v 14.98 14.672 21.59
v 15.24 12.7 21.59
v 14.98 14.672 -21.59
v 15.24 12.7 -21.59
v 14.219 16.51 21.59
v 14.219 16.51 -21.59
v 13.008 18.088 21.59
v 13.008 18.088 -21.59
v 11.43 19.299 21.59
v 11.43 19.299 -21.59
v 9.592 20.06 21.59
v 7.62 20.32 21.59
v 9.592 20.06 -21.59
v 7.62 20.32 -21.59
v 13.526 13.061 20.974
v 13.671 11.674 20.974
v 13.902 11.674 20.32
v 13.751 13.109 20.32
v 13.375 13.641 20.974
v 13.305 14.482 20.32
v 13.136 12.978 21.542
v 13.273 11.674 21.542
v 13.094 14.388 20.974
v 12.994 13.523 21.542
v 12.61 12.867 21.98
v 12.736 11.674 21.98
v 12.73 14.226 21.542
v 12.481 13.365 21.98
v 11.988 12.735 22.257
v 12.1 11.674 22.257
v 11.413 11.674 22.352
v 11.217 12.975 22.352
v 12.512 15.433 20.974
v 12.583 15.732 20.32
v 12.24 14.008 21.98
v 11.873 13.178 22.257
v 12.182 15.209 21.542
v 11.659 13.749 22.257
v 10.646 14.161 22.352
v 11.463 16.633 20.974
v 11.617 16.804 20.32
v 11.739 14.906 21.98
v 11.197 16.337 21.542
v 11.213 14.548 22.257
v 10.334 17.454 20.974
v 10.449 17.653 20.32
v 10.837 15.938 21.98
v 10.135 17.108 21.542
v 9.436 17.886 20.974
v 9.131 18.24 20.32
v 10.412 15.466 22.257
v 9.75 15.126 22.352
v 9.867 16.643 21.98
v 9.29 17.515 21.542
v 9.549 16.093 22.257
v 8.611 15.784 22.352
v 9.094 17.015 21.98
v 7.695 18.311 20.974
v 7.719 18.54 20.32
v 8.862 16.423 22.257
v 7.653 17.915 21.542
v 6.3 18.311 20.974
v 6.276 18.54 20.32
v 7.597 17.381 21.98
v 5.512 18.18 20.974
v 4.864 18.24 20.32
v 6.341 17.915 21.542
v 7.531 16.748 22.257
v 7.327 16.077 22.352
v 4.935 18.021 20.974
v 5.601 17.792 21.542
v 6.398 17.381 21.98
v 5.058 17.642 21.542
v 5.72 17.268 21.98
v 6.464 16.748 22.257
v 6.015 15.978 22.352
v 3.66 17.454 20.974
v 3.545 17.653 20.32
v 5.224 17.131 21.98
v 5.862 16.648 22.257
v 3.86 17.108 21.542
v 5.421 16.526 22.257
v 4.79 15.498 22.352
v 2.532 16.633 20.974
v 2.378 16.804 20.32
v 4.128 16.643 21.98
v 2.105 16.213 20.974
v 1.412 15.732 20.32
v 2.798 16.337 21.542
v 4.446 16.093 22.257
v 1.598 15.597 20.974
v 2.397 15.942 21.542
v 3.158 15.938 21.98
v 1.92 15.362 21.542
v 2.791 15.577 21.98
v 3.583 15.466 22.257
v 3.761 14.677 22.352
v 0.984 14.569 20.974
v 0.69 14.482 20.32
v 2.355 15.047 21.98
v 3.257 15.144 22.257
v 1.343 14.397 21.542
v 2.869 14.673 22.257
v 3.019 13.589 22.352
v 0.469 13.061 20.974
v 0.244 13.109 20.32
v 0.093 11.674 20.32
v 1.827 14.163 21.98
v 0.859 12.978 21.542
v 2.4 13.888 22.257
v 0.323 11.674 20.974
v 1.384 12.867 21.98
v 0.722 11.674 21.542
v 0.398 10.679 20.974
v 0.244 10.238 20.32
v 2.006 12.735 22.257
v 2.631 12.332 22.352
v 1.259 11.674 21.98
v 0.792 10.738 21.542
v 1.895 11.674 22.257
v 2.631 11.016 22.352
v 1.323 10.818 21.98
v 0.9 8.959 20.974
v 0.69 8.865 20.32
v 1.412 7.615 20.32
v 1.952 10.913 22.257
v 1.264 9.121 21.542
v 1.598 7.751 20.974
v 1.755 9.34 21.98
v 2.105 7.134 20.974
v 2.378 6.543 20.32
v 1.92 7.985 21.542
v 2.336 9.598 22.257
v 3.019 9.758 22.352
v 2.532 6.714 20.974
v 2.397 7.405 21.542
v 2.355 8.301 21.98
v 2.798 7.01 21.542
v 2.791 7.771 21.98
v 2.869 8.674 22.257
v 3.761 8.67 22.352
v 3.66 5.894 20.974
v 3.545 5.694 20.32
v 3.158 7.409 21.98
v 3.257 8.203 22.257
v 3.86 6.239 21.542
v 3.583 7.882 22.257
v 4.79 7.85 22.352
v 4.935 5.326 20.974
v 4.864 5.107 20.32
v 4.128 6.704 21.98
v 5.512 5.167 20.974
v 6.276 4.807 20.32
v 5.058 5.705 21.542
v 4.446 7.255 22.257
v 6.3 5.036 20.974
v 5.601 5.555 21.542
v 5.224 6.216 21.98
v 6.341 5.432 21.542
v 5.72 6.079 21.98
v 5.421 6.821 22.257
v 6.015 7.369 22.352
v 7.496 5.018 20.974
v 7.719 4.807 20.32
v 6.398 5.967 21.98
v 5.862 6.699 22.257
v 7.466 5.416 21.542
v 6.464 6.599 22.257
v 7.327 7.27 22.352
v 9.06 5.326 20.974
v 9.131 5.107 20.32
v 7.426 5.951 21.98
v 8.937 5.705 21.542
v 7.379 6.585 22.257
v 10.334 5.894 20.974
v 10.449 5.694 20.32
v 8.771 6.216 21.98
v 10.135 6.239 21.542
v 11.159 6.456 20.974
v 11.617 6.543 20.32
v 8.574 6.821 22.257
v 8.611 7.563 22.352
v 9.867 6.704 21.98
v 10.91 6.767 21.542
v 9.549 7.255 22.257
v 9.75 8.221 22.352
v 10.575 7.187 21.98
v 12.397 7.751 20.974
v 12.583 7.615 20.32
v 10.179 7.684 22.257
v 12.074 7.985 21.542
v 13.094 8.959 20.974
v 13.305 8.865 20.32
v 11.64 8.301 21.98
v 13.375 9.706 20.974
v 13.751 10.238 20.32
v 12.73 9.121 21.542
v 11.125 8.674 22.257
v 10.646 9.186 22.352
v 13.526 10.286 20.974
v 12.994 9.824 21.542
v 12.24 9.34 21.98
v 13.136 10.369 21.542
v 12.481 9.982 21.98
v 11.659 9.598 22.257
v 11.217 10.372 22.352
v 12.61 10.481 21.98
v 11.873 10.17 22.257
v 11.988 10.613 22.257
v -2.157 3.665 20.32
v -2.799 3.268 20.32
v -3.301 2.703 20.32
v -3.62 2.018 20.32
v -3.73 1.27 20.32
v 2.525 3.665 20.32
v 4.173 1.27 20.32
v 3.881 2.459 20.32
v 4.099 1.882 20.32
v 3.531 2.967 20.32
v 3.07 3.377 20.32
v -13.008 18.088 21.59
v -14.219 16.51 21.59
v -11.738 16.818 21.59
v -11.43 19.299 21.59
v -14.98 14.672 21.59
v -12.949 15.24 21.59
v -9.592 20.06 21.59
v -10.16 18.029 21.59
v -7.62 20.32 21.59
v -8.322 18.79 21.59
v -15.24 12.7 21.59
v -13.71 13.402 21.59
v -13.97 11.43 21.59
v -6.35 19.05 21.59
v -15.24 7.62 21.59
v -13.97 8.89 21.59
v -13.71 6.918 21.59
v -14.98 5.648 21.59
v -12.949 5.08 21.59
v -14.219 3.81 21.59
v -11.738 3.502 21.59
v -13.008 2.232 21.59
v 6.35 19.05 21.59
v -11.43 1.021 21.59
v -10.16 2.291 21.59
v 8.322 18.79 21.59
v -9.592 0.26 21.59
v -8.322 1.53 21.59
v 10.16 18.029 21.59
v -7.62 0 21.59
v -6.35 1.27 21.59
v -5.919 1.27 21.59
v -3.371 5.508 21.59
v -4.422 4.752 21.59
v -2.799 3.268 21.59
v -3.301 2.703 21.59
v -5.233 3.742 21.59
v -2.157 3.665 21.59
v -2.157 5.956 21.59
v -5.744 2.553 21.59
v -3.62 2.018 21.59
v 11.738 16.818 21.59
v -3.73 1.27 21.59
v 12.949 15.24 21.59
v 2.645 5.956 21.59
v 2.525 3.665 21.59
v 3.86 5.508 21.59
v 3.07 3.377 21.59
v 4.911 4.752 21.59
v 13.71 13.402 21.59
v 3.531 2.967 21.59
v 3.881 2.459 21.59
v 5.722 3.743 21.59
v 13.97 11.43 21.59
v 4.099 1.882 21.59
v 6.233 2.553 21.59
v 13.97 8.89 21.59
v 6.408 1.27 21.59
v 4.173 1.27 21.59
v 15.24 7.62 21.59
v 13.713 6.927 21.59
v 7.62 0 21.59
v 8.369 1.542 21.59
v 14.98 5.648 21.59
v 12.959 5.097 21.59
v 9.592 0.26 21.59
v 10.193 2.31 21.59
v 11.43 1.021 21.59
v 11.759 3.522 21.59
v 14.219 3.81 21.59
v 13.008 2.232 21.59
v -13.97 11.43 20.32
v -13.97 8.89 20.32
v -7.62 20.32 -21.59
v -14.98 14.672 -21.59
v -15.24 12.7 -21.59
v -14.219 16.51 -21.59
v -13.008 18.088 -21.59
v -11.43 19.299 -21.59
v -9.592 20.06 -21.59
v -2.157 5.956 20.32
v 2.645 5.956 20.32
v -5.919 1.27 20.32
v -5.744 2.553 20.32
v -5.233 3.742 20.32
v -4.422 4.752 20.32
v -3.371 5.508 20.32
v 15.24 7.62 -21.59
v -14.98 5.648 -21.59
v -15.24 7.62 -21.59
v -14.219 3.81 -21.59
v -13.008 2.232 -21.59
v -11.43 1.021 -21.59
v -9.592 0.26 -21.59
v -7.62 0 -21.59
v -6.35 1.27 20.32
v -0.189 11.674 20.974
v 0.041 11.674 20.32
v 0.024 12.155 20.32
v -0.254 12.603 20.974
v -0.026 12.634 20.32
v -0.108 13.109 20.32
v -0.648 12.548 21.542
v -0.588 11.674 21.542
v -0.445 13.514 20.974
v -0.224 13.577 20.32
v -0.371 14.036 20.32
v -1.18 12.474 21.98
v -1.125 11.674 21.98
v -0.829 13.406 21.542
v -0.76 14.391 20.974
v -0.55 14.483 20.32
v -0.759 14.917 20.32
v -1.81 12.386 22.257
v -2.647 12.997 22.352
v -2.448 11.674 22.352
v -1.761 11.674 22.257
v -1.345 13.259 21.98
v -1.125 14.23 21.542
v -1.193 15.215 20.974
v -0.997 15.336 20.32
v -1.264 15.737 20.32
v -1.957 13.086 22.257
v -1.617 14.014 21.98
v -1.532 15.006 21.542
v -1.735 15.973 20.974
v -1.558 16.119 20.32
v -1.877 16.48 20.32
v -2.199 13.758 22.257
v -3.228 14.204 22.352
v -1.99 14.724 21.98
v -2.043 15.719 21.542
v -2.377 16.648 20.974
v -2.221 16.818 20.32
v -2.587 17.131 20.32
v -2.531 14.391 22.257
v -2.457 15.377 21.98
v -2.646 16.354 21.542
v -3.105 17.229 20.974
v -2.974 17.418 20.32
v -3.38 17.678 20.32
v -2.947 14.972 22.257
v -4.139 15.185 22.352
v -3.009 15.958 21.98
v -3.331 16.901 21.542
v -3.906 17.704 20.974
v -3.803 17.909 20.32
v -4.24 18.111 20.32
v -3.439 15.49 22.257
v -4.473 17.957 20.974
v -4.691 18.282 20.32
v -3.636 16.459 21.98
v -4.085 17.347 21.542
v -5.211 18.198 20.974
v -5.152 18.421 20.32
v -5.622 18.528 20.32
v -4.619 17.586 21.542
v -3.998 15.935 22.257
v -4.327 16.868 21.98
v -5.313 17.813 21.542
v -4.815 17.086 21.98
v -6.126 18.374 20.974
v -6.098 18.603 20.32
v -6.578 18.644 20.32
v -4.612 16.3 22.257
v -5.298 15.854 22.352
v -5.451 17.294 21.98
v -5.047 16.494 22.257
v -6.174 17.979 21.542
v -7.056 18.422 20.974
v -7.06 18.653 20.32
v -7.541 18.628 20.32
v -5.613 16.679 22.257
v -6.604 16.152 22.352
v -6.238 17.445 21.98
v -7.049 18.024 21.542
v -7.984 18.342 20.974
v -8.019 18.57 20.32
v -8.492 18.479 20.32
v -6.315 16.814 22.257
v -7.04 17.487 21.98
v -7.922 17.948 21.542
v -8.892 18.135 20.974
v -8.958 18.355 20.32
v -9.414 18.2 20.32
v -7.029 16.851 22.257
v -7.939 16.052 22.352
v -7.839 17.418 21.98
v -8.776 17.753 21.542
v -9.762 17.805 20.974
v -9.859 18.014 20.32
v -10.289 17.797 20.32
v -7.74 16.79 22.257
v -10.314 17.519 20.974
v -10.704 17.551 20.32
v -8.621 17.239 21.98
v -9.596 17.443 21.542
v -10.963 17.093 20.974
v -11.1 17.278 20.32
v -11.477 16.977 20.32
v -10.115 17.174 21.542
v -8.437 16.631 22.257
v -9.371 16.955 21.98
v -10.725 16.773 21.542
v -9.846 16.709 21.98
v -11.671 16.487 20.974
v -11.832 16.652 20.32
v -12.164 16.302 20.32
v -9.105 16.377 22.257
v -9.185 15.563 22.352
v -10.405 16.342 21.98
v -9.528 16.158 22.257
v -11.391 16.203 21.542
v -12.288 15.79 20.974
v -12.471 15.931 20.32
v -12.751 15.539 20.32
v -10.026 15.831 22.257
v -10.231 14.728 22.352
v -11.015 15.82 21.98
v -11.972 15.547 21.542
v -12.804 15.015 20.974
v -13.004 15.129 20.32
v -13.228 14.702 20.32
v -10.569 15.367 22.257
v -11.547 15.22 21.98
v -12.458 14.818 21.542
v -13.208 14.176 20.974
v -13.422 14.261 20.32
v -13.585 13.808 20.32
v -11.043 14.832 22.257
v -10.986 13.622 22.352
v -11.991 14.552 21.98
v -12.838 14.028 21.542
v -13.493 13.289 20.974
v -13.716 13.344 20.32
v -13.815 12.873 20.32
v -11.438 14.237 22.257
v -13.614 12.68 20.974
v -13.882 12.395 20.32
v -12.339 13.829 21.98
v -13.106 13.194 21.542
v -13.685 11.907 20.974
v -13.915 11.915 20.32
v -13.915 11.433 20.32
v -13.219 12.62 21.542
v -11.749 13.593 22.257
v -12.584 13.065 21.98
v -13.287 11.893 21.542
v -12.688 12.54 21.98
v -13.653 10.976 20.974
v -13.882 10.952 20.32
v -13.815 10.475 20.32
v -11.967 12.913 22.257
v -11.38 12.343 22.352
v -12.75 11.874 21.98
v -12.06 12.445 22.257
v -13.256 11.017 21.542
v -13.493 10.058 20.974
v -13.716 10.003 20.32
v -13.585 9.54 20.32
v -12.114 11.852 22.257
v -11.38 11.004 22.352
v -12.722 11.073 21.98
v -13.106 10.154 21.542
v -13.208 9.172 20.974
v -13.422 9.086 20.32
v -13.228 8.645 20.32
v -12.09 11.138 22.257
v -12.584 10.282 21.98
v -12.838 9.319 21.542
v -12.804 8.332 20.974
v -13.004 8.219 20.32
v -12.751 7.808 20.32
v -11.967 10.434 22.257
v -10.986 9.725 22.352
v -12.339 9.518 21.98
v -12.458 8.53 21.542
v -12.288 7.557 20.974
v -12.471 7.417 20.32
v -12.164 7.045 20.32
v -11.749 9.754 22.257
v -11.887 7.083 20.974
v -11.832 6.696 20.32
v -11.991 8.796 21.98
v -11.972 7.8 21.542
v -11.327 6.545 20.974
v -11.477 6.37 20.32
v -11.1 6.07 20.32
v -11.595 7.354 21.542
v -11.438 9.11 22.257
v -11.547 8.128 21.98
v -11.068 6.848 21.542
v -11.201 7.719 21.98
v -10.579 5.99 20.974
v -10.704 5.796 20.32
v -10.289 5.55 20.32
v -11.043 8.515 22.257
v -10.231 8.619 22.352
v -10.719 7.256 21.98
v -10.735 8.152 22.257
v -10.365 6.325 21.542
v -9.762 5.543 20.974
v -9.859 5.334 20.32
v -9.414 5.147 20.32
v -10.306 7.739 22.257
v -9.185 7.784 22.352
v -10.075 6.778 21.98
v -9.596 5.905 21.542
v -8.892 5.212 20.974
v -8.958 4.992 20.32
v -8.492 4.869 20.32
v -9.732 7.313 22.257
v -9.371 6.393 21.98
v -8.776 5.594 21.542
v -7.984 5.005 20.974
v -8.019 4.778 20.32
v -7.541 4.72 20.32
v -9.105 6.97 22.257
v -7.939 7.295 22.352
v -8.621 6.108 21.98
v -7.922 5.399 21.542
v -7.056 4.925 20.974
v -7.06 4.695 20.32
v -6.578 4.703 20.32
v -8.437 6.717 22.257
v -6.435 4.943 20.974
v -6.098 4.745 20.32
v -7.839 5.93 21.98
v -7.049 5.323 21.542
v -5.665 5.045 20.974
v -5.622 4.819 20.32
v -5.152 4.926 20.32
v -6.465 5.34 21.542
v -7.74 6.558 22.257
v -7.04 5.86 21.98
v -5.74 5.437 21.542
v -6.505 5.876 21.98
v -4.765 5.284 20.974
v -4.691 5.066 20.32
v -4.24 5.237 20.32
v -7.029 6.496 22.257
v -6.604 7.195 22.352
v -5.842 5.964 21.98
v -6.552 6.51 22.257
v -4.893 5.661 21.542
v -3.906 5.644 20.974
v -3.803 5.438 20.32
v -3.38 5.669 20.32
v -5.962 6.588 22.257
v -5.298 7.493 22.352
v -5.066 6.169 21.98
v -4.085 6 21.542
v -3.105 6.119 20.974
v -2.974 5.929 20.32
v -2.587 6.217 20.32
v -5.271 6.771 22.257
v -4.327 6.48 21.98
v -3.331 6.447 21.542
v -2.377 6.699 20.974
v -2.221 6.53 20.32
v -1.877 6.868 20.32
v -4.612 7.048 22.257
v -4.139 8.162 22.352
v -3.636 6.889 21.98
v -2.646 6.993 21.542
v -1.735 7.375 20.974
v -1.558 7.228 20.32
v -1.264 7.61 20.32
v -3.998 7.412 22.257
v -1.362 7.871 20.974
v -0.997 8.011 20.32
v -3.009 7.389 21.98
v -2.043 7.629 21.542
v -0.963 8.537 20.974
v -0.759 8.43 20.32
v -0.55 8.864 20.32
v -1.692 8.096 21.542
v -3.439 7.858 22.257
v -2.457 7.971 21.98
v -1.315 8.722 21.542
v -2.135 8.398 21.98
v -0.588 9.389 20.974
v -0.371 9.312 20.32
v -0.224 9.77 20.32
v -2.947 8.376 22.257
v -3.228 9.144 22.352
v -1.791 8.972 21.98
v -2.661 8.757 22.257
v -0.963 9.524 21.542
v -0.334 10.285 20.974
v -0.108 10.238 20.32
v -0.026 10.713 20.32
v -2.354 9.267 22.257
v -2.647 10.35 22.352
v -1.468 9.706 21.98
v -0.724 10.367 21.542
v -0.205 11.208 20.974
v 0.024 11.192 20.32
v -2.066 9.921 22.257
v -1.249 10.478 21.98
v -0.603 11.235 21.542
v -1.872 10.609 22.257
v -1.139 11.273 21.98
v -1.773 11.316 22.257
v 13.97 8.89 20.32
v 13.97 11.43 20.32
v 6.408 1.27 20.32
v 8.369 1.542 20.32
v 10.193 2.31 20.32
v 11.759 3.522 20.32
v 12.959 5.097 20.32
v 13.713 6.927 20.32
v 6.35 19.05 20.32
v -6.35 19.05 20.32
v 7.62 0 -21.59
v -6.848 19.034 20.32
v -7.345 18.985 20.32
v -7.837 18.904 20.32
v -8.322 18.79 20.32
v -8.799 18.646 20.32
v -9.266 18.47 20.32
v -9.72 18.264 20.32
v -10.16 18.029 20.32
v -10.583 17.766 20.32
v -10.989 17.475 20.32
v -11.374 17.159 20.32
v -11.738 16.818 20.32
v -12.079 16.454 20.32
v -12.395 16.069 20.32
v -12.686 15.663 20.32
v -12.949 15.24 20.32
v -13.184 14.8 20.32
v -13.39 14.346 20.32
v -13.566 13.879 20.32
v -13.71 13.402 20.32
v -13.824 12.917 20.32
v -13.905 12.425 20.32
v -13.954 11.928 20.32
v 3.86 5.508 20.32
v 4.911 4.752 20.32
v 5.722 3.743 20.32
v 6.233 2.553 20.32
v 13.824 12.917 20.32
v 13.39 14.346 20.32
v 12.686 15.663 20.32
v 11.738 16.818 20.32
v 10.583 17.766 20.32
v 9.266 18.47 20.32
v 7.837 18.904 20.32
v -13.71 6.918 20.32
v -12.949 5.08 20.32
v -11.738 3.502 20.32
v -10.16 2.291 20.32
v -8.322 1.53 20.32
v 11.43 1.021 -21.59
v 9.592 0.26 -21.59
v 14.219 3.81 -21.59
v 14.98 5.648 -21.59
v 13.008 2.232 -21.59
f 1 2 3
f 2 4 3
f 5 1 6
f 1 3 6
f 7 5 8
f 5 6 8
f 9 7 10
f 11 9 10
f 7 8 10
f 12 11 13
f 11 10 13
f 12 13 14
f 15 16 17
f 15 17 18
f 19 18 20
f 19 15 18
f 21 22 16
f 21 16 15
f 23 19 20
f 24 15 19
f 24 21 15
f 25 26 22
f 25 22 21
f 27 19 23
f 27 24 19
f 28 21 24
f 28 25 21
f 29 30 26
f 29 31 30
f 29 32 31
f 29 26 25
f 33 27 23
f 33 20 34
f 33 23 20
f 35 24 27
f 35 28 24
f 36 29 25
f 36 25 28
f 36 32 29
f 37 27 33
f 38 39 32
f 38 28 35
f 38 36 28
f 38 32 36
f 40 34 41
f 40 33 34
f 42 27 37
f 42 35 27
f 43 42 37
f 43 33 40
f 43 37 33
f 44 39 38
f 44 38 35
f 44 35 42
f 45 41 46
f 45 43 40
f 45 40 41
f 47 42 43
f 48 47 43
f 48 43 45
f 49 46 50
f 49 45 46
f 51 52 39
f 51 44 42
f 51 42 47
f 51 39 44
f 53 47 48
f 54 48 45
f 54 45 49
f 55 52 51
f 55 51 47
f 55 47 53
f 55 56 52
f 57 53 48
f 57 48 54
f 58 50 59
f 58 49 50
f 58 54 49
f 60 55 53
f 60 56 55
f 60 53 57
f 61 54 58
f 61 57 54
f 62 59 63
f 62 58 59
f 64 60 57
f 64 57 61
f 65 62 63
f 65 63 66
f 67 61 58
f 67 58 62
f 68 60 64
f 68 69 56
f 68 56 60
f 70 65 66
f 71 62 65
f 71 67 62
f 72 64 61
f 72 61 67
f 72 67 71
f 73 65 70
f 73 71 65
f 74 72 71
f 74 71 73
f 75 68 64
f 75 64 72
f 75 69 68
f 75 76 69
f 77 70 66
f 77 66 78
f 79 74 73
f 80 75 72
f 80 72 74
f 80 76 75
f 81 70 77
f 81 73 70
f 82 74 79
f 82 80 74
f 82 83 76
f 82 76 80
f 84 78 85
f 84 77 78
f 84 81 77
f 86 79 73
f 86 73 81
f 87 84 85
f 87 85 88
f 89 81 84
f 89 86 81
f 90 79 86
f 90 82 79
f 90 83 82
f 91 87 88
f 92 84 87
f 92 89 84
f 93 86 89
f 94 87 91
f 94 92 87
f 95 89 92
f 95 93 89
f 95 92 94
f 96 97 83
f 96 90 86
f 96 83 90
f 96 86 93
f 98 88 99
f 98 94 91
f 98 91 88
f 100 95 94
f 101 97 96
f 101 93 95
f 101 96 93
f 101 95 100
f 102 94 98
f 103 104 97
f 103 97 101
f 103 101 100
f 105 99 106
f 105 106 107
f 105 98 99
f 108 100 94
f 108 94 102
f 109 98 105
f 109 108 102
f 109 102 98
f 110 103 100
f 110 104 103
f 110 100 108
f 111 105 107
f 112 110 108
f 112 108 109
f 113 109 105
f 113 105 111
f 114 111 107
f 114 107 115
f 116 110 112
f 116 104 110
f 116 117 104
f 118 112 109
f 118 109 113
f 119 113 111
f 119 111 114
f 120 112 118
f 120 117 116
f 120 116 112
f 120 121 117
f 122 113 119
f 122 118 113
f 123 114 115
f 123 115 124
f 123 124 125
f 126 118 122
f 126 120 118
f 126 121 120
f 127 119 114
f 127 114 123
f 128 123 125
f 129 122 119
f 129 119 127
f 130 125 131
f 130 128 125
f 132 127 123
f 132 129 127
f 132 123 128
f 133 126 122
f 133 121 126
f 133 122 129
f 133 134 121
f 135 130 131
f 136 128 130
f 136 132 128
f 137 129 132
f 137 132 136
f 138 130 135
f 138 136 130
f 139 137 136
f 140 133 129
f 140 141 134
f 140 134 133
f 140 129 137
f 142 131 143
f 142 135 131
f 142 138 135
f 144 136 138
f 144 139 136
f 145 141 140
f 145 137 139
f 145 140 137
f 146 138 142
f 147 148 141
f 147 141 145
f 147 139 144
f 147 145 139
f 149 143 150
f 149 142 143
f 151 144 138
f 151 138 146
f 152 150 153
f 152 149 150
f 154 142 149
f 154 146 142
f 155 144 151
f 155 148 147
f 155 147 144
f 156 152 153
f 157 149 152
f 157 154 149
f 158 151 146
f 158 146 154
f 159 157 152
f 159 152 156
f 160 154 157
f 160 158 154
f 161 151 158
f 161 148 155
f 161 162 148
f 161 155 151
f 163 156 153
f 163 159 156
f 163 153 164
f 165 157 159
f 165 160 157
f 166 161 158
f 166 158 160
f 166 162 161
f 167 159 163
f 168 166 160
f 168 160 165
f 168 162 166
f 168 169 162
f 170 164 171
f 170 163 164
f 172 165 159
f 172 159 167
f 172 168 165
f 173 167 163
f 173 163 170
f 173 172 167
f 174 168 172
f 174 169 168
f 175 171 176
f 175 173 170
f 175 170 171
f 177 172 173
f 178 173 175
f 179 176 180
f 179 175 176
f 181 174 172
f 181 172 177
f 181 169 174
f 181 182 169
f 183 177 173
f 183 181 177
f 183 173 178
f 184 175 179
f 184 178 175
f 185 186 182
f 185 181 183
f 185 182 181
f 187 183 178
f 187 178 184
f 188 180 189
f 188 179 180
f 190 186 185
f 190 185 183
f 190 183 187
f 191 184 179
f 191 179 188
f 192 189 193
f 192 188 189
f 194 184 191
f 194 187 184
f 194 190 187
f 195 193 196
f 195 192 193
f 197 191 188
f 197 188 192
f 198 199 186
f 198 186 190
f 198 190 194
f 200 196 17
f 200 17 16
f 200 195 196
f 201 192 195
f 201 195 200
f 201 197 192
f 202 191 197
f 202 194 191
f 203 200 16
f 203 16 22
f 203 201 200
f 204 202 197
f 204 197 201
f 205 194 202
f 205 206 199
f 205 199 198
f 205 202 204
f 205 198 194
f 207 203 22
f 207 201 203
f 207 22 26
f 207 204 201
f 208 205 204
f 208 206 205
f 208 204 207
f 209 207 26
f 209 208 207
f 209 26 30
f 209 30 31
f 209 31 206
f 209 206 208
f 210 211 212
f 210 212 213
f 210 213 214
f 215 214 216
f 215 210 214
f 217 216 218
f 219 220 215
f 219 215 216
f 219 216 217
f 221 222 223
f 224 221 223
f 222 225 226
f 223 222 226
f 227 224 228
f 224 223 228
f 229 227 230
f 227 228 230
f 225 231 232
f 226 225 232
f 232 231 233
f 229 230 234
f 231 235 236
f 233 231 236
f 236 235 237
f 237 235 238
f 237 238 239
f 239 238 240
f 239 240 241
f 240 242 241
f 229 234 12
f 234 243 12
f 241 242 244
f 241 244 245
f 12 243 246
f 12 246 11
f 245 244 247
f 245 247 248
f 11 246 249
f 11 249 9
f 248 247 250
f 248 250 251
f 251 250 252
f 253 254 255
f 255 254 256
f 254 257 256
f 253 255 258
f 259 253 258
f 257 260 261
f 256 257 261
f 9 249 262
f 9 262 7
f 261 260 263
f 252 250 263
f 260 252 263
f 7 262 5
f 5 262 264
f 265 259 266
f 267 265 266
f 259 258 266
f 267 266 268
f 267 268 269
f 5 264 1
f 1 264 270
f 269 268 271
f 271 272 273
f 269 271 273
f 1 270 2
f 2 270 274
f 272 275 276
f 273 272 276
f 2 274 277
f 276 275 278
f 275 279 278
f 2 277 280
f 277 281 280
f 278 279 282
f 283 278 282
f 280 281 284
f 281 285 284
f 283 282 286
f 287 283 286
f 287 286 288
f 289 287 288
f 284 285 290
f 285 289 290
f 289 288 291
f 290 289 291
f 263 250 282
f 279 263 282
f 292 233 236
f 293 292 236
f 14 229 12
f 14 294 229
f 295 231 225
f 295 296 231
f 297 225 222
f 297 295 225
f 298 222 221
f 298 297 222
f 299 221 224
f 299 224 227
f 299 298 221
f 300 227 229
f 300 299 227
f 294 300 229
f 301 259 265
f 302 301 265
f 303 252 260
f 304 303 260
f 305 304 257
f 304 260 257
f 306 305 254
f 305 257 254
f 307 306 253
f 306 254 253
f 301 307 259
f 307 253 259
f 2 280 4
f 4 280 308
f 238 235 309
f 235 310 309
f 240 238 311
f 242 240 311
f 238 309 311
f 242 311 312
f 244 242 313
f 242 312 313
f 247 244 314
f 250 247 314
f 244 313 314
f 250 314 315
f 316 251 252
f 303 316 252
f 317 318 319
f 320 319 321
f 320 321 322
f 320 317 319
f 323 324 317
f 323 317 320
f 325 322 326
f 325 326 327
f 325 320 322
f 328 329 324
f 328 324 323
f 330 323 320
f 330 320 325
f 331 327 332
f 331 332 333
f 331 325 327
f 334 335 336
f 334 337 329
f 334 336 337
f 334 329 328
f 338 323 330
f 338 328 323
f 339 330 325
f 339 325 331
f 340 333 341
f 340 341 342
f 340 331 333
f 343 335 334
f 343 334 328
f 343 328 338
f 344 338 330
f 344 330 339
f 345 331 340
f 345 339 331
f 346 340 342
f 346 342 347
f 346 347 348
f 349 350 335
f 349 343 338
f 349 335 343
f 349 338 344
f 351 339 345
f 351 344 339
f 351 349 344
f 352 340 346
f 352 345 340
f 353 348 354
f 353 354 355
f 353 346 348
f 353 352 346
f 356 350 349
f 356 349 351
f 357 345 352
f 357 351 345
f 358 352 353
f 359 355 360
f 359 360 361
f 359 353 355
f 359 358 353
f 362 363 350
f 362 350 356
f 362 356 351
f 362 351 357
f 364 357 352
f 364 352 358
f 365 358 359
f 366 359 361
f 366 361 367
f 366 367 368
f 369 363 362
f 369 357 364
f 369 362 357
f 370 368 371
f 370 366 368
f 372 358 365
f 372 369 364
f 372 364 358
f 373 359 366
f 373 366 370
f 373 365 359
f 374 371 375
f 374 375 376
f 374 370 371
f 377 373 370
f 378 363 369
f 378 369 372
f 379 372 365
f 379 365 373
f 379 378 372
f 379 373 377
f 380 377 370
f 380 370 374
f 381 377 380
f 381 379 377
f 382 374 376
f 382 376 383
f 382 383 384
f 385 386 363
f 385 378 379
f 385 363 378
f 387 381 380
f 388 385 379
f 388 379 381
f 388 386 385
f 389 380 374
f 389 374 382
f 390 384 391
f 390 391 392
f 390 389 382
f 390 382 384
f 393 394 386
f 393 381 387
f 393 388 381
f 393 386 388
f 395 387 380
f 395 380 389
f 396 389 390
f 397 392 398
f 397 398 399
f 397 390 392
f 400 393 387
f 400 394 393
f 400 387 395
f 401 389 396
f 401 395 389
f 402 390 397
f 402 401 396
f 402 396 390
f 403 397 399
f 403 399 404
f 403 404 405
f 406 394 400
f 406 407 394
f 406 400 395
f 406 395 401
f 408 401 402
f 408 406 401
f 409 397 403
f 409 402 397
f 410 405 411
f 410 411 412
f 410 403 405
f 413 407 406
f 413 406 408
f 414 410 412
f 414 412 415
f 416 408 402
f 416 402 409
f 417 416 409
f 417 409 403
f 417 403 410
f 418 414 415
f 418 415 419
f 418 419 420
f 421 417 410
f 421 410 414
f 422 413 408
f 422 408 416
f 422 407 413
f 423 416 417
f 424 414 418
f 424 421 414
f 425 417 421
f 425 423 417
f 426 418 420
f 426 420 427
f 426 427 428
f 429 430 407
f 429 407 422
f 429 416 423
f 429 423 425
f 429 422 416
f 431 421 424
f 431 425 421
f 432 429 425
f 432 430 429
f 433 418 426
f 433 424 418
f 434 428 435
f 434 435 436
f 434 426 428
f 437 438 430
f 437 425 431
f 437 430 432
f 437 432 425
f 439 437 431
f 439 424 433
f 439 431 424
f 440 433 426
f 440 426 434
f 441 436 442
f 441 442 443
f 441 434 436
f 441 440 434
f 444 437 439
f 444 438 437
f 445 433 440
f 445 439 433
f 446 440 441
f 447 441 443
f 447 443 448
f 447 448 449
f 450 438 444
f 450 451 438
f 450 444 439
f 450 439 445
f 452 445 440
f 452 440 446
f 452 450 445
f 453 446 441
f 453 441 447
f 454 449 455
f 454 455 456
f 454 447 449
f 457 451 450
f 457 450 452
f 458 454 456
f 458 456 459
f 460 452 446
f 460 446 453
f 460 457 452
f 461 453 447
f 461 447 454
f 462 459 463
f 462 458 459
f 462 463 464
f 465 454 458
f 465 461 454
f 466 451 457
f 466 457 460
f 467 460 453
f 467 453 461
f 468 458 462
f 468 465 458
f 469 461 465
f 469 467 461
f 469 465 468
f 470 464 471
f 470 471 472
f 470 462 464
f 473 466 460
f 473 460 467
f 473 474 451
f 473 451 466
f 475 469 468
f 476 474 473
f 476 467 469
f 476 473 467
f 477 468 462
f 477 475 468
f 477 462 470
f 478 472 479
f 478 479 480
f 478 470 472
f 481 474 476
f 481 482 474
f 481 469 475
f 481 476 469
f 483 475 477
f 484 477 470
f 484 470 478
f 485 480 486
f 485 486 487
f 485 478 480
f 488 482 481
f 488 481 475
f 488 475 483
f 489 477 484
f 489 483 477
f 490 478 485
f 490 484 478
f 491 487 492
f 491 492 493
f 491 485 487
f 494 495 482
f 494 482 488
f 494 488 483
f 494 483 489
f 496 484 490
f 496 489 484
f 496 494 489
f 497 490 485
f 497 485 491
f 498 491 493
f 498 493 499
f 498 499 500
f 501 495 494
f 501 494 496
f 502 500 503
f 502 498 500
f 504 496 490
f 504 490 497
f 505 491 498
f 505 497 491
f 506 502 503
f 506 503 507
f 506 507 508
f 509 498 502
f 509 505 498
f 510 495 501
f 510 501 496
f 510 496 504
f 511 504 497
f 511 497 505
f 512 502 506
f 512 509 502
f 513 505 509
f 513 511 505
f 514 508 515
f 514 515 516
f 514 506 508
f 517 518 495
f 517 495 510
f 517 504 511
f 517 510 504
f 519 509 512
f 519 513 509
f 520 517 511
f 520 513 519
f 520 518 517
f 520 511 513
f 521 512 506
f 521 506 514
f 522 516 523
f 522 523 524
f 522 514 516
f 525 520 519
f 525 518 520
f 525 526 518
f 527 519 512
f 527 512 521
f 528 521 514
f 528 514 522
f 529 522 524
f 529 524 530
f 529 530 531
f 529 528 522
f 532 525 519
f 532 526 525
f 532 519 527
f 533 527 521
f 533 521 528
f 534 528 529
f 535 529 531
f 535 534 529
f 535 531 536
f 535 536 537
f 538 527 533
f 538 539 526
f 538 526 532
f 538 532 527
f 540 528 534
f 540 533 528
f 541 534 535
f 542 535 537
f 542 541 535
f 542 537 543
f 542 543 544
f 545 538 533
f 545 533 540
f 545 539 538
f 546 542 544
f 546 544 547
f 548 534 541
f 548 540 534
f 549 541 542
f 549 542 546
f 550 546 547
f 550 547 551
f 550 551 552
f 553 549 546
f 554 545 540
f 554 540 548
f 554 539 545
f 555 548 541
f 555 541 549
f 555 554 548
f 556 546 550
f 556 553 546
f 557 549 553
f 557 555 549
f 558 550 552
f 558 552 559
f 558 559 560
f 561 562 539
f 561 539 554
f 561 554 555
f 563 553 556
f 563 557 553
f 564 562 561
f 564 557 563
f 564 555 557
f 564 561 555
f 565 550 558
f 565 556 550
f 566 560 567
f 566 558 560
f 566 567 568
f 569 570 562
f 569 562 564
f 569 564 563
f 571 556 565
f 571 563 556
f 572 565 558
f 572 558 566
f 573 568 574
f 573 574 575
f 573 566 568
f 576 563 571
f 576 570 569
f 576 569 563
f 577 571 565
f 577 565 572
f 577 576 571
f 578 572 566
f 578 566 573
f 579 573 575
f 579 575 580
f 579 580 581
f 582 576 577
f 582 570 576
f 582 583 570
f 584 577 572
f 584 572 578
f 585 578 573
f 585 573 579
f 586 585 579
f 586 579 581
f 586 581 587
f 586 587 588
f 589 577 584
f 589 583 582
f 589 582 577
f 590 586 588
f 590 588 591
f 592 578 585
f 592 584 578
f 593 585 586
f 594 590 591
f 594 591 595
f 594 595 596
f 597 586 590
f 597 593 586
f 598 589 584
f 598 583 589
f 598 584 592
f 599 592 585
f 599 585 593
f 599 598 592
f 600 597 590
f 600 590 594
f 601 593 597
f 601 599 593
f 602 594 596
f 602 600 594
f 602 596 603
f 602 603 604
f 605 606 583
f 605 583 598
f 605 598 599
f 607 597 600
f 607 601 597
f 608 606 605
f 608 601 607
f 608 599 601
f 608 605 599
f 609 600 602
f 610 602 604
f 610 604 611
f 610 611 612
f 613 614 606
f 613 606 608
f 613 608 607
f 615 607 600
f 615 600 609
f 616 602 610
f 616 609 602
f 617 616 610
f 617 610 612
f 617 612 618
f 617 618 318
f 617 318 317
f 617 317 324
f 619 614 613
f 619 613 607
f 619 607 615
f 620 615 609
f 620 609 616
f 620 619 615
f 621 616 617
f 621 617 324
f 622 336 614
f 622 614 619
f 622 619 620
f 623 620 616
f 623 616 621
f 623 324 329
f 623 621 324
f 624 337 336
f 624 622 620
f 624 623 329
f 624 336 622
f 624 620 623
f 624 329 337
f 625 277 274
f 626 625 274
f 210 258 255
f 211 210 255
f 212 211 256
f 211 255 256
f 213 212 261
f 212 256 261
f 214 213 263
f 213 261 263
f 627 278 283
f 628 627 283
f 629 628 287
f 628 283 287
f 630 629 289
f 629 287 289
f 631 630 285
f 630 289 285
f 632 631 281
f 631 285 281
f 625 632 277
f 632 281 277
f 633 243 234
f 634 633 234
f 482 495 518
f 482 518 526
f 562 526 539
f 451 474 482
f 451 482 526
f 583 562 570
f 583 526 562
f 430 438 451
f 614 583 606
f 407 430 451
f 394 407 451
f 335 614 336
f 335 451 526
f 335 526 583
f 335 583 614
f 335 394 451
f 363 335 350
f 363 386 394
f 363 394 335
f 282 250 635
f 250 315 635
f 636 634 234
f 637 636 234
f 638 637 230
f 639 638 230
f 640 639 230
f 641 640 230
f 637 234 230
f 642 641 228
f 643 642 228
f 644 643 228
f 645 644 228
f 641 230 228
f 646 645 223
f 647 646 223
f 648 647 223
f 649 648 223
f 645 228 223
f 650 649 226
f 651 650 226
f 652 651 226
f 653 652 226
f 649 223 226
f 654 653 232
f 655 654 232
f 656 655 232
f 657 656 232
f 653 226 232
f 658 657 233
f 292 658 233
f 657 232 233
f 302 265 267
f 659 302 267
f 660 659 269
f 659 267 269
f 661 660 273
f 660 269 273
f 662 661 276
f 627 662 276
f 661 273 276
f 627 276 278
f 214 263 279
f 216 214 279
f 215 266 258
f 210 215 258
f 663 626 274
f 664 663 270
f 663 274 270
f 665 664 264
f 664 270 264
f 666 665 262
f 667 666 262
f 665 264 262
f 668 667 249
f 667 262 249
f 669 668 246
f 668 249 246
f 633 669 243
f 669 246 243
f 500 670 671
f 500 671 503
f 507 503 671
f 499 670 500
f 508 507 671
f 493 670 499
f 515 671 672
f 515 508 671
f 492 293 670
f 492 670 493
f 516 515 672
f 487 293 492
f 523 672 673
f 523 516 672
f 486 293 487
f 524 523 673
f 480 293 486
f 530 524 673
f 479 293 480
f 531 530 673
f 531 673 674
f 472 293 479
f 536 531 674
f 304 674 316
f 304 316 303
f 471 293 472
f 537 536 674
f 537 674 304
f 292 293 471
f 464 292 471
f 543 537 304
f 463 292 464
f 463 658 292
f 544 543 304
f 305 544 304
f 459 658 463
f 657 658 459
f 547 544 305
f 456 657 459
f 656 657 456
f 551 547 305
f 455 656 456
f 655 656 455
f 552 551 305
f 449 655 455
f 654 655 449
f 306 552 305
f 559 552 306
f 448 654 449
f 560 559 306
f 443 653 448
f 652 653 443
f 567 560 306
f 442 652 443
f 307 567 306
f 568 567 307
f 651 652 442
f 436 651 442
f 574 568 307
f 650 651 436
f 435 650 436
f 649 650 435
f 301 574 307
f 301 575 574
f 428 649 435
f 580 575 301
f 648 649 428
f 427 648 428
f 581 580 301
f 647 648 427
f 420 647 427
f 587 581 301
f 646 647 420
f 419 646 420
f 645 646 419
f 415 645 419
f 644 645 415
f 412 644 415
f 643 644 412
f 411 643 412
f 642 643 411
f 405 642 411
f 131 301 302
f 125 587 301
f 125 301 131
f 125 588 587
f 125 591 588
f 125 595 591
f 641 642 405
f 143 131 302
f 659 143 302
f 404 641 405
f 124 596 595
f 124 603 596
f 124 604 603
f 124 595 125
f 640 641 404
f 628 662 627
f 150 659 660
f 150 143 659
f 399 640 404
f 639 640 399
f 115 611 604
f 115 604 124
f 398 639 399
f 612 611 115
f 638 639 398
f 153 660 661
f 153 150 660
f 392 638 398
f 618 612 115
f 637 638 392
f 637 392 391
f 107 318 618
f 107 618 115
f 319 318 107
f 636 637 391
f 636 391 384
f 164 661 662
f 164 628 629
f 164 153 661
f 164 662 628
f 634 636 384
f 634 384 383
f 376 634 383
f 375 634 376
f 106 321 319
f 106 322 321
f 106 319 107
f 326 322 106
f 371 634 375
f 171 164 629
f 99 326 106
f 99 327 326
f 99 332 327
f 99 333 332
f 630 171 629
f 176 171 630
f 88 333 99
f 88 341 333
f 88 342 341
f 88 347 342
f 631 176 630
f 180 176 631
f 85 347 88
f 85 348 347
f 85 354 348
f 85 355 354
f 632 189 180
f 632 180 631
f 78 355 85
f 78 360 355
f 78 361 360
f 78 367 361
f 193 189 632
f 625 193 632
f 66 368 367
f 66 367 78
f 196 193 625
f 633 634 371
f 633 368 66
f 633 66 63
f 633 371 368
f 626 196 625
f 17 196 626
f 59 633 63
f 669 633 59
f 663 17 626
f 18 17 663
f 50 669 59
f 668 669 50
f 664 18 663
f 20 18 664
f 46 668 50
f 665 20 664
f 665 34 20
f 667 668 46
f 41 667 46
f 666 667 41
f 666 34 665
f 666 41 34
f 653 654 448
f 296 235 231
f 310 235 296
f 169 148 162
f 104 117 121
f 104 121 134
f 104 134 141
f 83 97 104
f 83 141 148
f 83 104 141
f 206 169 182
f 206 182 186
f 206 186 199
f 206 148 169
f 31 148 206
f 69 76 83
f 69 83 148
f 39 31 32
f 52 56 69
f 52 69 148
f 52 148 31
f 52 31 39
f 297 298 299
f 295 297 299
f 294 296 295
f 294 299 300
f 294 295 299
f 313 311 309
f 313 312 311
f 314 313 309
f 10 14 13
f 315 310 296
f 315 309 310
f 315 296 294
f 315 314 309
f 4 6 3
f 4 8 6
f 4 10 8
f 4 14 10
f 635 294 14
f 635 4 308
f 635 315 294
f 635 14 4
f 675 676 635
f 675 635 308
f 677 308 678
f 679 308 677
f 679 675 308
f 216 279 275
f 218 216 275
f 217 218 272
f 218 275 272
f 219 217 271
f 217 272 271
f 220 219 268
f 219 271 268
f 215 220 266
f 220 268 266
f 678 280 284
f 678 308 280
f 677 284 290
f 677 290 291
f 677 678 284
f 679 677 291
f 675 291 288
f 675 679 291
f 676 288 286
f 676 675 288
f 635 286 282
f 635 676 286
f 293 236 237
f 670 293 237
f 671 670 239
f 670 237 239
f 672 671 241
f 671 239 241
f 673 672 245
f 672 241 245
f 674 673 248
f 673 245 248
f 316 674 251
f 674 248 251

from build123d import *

# Parameters (mm, degrees)
SKETCH1_W           = 30.48
SKETCH1_H           = 43.18
BOSS_EXTRUDE1_DEPTH = 20.32
FILLET1_R           = 7.62
CUT_EXTRUDE2_DEPTH  = 1.27
SKETCH3_R           = 6.979927777
SKETCH3_R_2         = 6.904229814
BOSS_EXTRUDE2_DEPTH = 2.032
FILLET2_R           = 2.54


with BuildPart() as part:
    # Sketch1 → Boss-Extrude1 (new body)
    with BuildSketch(Plane(origin=(0, 0, 0), x_dir=(1, 0, 0), z_dir=(0, 1, 0))):
        Rectangle(SKETCH1_W, SKETCH1_H)
    extrude(amount=BOSS_EXTRUDE1_DEPTH)

    # Fillet1
    fillet1_edges = [part.edges().sort_by_distance(p)[0] for p in [
        (15.24, 20.32, 0),
        (-15.24, 20.32, 0),
        (15.24, 0, 0),
        (-15.24, 0, 0),
    ]]
    fillet(fillet1_edges, radius=FILLET1_R)

    # Sketch2 → Cut-Extrude2 (cut)
    with BuildSketch(Plane.XY.offset(21.59)):
        with BuildLine():
            Line((-3.729733948, 1.27), (4.173096077, 1.27))
            ThreePointArc((4.173096077, 1.27), (3.721271351, 2.723698057), (2.525007795, 3.66515285))
            Line((2.525007795, 3.66515285), (-2.15658026, 3.66515285))
            ThreePointArc((-2.15658026, 3.66515285), (-3.301276498, 2.702791829), (-3.729733948, 1.27))
        make_face()
        with BuildLine():
            ThreePointArc((2.645377511, 5.955761741), (5.350660012, 4.274727675), (6.407709564, 1.270218533))
            ThreePointArc((6.407709564, 1.270218533), (11.758518599, 3.522288517), (13.97, 8.89))
            Line((13.97, 8.89), (13.97, 11.43))
            ThreePointArc((13.97, 11.43), (11.738153673, 16.818153673), (6.35, 19.05))
            Line((6.35, 19.05), (-6.35, 19.05))
            ThreePointArc((-6.35, 19.05), (-11.738153673, 16.818153673), (-13.97, 11.43))
            Line((-13.97, 11.43), (-13.97, 8.89))
            ThreePointArc((-13.97, 8.89), (-11.738153673, 3.501846327), (-6.35, 1.27))
            Line((-6.35, 1.27), (-5.918912318, 1.27))
            ThreePointArc((-5.918912318, 1.27), (-4.861931172, 4.274642475), (-2.15658026, 5.955761741))
            Line((-2.15658026, 5.955761741), (2.645377511, 5.955761741))
        make_face()
    extrude(amount=-CUT_EXTRUDE2_DEPTH, mode=Mode.SUBTRACT)

    # Sketch3 → Boss-Extrude2 (add)
    with BuildSketch(Plane.XY.offset(20.32)):
        with Locations((-6.939175258, 11.673649258)):
            Circle(SKETCH3_R)
        with Locations((6.997365407, 11.673649258)):
            Circle(SKETCH3_R_2)
    extrude(amount=BOSS_EXTRUDE2_DEPTH)

    # Fillet2
    # the kernel refuses this fillet: 2.54 mm, written as the material it takes off along each edge
    with BuildSketch(Plane(origin=(-6.939175258, 11.673649258, 22.352), x_dir=(1, 0, 0), z_dir=(0, -1, 0))) as fillet2_piece_1:
        with BuildLine():
            CenterArc((4.491246199, -2.54), FILLET2_R, 11.536959033, 78.463040967)
            Line((4.491246199, 0), (6.979927777, 0))
            Line((6.979927777, 0), (6.979927777, -2.032))
        make_face()
    revolve(axis=Axis((-6.939175258, 11.673649258, 22.352), (0, 0, 1)), mode=Mode.SUBTRACT)
    with BuildSketch(Plane(origin=(6.997365407, 11.673649258, 22.352), x_dir=(1, 0, 0), z_dir=(0, -1, 0))) as fillet2_piece_2:
        with BuildLine():
            CenterArc((4.415548235, -2.54), FILLET2_R, 11.536959033, 78.463040967)
            Line((4.415548235, 0), (6.904229814, 0))
            Line((6.904229814, 0), (6.904229814, -2.032))
        make_face()
    revolve(axis=Axis((6.997365407, 11.673649258, 22.352), (0, 0, 1)), mode=Mode.SUBTRACT)


solid = part.part
